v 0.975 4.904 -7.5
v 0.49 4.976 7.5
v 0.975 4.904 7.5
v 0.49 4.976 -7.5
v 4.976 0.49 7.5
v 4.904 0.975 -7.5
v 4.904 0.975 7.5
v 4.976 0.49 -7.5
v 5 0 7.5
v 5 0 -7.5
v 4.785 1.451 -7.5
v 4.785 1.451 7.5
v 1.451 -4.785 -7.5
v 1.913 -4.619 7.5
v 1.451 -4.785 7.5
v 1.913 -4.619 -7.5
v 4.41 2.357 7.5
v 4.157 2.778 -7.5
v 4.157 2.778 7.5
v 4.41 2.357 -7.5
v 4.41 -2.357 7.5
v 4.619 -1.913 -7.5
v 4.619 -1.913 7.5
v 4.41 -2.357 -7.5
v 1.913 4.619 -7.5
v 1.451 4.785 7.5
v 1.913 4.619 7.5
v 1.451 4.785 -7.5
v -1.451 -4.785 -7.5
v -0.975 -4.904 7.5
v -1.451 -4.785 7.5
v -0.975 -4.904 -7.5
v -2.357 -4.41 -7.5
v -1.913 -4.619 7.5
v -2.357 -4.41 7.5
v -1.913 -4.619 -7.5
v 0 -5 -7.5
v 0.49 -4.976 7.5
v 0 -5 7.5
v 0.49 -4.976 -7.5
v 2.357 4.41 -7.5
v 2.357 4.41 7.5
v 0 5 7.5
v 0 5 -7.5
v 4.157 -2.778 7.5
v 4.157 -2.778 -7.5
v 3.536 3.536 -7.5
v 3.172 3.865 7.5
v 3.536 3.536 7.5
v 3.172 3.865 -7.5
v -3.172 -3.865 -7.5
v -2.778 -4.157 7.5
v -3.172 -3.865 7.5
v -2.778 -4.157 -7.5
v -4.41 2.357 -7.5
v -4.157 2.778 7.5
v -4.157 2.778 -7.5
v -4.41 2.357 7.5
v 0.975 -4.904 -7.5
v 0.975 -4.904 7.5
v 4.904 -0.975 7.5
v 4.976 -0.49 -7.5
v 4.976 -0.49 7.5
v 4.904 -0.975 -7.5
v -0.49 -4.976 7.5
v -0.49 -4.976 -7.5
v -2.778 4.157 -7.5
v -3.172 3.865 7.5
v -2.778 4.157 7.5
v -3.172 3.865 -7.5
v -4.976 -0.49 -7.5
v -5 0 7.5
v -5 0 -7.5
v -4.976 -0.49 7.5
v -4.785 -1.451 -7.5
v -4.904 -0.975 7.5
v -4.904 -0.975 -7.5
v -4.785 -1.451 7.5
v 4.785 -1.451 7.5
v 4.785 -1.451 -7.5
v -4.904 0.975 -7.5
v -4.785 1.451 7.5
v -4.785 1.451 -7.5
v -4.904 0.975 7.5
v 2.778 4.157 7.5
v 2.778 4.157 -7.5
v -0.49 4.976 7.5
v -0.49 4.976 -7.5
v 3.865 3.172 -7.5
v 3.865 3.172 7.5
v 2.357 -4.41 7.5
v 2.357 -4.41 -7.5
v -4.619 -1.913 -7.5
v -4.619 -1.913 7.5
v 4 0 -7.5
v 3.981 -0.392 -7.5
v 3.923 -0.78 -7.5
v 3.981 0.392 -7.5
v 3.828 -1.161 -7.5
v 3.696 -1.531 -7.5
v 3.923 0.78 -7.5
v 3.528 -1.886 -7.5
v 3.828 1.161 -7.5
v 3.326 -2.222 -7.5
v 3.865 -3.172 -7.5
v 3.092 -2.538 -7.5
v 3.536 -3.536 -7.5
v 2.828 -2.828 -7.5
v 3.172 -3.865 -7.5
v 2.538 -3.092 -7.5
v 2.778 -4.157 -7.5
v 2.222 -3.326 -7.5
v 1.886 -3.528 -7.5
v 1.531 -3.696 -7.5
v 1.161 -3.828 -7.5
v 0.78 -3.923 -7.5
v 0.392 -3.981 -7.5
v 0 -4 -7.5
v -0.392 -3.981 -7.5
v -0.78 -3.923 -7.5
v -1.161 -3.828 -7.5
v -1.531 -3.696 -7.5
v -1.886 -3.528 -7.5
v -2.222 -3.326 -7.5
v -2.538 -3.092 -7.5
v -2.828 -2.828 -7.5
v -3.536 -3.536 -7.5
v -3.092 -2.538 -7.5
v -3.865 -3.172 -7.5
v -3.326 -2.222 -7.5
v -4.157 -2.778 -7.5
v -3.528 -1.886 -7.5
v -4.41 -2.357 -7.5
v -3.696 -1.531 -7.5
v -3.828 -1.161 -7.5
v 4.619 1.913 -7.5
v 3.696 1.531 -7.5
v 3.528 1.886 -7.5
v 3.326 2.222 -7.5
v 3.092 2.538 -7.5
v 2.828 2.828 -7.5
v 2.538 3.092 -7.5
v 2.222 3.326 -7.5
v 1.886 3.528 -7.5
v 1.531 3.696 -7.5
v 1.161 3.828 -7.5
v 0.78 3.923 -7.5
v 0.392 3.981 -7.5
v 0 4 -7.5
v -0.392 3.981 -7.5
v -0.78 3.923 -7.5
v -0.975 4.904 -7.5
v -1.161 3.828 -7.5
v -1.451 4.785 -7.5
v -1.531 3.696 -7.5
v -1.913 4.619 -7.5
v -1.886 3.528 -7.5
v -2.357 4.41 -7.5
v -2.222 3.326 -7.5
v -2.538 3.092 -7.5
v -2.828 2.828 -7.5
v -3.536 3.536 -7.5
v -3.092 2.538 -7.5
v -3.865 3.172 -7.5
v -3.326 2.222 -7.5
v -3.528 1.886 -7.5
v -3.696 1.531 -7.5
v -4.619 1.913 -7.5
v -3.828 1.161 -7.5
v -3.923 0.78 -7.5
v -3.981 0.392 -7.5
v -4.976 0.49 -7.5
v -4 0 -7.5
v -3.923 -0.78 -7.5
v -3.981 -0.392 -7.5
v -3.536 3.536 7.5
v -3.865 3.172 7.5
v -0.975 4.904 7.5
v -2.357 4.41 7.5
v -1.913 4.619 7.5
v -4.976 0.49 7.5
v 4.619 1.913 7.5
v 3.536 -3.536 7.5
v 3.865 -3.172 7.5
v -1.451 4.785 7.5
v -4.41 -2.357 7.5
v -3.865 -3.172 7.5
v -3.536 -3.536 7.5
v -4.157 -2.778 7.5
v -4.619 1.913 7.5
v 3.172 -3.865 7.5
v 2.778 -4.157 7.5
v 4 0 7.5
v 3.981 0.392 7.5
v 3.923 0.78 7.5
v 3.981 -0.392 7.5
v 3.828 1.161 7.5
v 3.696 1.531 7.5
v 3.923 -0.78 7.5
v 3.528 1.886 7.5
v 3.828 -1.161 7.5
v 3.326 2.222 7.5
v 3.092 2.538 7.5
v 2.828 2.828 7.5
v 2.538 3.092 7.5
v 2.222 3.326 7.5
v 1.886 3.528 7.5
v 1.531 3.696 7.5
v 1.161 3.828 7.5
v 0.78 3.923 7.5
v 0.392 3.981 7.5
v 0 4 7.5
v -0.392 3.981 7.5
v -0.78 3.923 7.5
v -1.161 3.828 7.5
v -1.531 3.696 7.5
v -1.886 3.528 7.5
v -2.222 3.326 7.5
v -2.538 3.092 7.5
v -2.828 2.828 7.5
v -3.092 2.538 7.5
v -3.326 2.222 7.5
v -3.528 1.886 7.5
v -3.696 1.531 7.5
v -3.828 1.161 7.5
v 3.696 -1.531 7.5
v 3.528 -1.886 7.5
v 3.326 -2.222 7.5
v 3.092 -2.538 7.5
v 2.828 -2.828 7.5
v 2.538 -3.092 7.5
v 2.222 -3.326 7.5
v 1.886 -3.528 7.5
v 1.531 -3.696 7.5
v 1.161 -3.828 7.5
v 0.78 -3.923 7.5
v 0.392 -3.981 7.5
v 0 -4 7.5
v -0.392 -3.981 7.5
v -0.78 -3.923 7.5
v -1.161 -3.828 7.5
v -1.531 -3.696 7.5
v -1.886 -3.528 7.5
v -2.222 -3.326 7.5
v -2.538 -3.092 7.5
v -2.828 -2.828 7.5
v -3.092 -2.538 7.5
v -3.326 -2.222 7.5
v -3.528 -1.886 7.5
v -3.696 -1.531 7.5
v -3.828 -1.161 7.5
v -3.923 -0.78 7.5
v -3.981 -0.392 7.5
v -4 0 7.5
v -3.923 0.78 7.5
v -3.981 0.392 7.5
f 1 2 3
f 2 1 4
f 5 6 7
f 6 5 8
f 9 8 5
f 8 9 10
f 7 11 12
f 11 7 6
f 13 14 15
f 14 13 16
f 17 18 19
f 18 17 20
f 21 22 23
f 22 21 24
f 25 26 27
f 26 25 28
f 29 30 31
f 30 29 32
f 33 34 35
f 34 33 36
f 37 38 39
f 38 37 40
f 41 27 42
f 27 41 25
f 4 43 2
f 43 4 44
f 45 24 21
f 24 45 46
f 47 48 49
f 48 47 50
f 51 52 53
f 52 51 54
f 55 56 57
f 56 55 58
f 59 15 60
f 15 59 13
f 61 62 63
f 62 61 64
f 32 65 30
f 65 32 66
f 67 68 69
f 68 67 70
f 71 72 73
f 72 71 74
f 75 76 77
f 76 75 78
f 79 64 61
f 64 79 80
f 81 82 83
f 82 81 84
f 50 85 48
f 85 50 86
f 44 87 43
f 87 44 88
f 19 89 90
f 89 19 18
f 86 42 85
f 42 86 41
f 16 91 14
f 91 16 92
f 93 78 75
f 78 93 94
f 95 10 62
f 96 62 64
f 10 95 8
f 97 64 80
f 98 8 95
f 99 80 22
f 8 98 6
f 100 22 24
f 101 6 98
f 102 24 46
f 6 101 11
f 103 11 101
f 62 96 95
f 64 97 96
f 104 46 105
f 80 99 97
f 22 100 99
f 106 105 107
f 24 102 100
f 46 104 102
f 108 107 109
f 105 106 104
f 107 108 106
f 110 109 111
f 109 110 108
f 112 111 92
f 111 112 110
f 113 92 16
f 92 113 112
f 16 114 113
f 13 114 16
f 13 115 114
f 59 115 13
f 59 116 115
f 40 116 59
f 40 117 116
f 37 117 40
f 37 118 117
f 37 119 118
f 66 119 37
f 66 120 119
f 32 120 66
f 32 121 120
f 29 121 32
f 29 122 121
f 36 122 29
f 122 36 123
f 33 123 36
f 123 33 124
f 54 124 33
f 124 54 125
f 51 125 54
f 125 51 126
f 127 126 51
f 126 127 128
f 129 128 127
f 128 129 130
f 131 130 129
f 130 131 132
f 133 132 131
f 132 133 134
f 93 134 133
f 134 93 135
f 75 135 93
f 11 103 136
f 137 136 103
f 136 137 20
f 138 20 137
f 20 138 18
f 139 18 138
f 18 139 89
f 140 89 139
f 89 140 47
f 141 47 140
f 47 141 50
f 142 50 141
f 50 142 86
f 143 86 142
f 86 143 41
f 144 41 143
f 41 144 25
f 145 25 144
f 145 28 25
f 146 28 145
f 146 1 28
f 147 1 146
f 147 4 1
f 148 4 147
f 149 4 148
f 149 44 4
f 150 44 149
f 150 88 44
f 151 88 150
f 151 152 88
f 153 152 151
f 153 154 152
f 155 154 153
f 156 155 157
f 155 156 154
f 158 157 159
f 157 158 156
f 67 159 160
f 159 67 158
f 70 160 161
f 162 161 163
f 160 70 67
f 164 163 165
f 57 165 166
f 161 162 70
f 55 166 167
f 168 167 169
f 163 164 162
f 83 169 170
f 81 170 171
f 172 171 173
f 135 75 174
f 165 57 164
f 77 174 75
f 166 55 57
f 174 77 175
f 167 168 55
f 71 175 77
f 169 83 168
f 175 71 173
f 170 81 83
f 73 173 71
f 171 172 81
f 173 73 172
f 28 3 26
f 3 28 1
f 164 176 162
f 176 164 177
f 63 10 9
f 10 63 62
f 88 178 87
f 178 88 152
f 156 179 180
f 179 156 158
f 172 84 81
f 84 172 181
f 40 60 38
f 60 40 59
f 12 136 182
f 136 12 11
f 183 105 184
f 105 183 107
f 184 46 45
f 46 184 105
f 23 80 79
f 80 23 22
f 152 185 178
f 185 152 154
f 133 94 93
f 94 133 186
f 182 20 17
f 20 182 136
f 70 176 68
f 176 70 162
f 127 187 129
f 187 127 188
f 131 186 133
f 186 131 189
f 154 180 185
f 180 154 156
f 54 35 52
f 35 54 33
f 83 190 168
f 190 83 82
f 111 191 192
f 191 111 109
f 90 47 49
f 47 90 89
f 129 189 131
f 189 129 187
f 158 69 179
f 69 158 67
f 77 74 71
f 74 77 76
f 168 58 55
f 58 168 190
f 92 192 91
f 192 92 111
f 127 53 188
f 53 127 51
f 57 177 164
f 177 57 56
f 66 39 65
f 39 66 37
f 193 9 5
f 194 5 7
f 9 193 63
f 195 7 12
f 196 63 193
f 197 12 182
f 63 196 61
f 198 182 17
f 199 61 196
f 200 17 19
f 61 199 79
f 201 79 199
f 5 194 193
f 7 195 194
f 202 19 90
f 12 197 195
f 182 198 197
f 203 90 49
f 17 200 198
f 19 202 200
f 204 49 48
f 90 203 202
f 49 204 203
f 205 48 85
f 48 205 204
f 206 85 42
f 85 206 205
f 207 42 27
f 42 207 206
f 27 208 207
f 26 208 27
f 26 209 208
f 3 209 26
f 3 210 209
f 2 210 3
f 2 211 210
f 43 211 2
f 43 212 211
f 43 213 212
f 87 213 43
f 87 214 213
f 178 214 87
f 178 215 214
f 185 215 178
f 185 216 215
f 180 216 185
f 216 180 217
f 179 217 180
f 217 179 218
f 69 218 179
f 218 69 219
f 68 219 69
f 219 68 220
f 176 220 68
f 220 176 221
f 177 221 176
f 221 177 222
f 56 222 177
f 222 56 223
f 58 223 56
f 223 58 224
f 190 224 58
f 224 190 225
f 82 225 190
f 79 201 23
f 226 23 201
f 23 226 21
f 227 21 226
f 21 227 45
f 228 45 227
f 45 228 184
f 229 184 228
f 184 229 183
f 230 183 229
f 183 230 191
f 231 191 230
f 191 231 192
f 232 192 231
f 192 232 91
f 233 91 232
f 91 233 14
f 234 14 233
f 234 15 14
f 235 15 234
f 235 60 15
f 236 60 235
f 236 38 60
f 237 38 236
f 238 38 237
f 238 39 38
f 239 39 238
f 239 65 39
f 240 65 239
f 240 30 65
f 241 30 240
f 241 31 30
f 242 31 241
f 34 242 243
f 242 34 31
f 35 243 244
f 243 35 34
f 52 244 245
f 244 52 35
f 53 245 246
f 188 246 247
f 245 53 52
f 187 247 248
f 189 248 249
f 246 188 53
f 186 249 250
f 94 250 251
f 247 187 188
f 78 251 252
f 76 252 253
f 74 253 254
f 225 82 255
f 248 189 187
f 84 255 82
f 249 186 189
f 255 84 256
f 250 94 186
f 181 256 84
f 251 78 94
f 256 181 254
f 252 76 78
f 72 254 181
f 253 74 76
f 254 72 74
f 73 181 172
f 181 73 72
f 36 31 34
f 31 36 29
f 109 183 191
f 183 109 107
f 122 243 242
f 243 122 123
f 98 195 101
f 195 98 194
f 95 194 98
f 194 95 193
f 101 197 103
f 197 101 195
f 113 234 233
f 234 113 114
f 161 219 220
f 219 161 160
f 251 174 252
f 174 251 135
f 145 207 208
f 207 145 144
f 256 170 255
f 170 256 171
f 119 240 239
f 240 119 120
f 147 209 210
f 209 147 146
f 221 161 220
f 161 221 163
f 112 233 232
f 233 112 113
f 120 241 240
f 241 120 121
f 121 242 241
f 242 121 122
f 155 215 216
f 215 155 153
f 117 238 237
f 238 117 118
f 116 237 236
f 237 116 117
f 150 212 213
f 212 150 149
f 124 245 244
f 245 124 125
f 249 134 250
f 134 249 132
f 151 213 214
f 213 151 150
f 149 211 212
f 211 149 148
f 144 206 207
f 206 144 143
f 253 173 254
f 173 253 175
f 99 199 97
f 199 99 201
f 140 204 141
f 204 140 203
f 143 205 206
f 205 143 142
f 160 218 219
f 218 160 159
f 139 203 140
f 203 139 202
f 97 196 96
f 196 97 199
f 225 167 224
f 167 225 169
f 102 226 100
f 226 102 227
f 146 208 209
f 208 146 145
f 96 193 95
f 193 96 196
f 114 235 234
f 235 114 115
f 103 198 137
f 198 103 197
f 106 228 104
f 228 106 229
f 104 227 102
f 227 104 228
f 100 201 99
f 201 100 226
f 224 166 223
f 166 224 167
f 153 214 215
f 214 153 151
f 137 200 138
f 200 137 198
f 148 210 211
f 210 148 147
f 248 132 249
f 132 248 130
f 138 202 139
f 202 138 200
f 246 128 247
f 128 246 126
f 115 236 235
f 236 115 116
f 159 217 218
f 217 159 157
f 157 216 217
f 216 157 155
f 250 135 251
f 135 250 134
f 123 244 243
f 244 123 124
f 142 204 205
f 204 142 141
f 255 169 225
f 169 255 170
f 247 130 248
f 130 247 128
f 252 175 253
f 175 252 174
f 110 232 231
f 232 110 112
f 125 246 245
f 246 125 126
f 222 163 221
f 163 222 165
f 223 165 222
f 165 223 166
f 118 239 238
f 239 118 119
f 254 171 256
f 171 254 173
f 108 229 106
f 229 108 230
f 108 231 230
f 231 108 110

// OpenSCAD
// Parameters
length = 15; //[7.5:30:0.5]
outer_diameter = 10; //[5:20:0.5]
inner_diameter = 8; //[4:16:0.5]
forced_id = 0; //[0:16:0.5]
center = 1; //[0:1:1]
overlap = 1; //[0.5:2:0.1]

// Tubing - complete geometry
module tubing() {
  color([0.85, 0.85, 0.8]) { // Off-white for PVC
    difference() {
      // Outer tube
      translate([0, 0, (center > 0) ? 0 : (length / 2)]) 
        cylinder(h=length, r=((forced_id > 0) ? (outer_diameter + forced_id - inner_diameter) : outer_diameter) / 2, center=true, $fn=64);
      
      // Inner bore
      translate([0, 0, (center > 0) ? 0 : (length / 2)]) 
        cylinder(h=length + overlap * 2, r=((forced_id > 0) ? forced_id : inner_diameter) / 2, center=true, $fn=64);
    }
  }
}

// Assembly
module assembly() {
  tubing();
}

assembly();
